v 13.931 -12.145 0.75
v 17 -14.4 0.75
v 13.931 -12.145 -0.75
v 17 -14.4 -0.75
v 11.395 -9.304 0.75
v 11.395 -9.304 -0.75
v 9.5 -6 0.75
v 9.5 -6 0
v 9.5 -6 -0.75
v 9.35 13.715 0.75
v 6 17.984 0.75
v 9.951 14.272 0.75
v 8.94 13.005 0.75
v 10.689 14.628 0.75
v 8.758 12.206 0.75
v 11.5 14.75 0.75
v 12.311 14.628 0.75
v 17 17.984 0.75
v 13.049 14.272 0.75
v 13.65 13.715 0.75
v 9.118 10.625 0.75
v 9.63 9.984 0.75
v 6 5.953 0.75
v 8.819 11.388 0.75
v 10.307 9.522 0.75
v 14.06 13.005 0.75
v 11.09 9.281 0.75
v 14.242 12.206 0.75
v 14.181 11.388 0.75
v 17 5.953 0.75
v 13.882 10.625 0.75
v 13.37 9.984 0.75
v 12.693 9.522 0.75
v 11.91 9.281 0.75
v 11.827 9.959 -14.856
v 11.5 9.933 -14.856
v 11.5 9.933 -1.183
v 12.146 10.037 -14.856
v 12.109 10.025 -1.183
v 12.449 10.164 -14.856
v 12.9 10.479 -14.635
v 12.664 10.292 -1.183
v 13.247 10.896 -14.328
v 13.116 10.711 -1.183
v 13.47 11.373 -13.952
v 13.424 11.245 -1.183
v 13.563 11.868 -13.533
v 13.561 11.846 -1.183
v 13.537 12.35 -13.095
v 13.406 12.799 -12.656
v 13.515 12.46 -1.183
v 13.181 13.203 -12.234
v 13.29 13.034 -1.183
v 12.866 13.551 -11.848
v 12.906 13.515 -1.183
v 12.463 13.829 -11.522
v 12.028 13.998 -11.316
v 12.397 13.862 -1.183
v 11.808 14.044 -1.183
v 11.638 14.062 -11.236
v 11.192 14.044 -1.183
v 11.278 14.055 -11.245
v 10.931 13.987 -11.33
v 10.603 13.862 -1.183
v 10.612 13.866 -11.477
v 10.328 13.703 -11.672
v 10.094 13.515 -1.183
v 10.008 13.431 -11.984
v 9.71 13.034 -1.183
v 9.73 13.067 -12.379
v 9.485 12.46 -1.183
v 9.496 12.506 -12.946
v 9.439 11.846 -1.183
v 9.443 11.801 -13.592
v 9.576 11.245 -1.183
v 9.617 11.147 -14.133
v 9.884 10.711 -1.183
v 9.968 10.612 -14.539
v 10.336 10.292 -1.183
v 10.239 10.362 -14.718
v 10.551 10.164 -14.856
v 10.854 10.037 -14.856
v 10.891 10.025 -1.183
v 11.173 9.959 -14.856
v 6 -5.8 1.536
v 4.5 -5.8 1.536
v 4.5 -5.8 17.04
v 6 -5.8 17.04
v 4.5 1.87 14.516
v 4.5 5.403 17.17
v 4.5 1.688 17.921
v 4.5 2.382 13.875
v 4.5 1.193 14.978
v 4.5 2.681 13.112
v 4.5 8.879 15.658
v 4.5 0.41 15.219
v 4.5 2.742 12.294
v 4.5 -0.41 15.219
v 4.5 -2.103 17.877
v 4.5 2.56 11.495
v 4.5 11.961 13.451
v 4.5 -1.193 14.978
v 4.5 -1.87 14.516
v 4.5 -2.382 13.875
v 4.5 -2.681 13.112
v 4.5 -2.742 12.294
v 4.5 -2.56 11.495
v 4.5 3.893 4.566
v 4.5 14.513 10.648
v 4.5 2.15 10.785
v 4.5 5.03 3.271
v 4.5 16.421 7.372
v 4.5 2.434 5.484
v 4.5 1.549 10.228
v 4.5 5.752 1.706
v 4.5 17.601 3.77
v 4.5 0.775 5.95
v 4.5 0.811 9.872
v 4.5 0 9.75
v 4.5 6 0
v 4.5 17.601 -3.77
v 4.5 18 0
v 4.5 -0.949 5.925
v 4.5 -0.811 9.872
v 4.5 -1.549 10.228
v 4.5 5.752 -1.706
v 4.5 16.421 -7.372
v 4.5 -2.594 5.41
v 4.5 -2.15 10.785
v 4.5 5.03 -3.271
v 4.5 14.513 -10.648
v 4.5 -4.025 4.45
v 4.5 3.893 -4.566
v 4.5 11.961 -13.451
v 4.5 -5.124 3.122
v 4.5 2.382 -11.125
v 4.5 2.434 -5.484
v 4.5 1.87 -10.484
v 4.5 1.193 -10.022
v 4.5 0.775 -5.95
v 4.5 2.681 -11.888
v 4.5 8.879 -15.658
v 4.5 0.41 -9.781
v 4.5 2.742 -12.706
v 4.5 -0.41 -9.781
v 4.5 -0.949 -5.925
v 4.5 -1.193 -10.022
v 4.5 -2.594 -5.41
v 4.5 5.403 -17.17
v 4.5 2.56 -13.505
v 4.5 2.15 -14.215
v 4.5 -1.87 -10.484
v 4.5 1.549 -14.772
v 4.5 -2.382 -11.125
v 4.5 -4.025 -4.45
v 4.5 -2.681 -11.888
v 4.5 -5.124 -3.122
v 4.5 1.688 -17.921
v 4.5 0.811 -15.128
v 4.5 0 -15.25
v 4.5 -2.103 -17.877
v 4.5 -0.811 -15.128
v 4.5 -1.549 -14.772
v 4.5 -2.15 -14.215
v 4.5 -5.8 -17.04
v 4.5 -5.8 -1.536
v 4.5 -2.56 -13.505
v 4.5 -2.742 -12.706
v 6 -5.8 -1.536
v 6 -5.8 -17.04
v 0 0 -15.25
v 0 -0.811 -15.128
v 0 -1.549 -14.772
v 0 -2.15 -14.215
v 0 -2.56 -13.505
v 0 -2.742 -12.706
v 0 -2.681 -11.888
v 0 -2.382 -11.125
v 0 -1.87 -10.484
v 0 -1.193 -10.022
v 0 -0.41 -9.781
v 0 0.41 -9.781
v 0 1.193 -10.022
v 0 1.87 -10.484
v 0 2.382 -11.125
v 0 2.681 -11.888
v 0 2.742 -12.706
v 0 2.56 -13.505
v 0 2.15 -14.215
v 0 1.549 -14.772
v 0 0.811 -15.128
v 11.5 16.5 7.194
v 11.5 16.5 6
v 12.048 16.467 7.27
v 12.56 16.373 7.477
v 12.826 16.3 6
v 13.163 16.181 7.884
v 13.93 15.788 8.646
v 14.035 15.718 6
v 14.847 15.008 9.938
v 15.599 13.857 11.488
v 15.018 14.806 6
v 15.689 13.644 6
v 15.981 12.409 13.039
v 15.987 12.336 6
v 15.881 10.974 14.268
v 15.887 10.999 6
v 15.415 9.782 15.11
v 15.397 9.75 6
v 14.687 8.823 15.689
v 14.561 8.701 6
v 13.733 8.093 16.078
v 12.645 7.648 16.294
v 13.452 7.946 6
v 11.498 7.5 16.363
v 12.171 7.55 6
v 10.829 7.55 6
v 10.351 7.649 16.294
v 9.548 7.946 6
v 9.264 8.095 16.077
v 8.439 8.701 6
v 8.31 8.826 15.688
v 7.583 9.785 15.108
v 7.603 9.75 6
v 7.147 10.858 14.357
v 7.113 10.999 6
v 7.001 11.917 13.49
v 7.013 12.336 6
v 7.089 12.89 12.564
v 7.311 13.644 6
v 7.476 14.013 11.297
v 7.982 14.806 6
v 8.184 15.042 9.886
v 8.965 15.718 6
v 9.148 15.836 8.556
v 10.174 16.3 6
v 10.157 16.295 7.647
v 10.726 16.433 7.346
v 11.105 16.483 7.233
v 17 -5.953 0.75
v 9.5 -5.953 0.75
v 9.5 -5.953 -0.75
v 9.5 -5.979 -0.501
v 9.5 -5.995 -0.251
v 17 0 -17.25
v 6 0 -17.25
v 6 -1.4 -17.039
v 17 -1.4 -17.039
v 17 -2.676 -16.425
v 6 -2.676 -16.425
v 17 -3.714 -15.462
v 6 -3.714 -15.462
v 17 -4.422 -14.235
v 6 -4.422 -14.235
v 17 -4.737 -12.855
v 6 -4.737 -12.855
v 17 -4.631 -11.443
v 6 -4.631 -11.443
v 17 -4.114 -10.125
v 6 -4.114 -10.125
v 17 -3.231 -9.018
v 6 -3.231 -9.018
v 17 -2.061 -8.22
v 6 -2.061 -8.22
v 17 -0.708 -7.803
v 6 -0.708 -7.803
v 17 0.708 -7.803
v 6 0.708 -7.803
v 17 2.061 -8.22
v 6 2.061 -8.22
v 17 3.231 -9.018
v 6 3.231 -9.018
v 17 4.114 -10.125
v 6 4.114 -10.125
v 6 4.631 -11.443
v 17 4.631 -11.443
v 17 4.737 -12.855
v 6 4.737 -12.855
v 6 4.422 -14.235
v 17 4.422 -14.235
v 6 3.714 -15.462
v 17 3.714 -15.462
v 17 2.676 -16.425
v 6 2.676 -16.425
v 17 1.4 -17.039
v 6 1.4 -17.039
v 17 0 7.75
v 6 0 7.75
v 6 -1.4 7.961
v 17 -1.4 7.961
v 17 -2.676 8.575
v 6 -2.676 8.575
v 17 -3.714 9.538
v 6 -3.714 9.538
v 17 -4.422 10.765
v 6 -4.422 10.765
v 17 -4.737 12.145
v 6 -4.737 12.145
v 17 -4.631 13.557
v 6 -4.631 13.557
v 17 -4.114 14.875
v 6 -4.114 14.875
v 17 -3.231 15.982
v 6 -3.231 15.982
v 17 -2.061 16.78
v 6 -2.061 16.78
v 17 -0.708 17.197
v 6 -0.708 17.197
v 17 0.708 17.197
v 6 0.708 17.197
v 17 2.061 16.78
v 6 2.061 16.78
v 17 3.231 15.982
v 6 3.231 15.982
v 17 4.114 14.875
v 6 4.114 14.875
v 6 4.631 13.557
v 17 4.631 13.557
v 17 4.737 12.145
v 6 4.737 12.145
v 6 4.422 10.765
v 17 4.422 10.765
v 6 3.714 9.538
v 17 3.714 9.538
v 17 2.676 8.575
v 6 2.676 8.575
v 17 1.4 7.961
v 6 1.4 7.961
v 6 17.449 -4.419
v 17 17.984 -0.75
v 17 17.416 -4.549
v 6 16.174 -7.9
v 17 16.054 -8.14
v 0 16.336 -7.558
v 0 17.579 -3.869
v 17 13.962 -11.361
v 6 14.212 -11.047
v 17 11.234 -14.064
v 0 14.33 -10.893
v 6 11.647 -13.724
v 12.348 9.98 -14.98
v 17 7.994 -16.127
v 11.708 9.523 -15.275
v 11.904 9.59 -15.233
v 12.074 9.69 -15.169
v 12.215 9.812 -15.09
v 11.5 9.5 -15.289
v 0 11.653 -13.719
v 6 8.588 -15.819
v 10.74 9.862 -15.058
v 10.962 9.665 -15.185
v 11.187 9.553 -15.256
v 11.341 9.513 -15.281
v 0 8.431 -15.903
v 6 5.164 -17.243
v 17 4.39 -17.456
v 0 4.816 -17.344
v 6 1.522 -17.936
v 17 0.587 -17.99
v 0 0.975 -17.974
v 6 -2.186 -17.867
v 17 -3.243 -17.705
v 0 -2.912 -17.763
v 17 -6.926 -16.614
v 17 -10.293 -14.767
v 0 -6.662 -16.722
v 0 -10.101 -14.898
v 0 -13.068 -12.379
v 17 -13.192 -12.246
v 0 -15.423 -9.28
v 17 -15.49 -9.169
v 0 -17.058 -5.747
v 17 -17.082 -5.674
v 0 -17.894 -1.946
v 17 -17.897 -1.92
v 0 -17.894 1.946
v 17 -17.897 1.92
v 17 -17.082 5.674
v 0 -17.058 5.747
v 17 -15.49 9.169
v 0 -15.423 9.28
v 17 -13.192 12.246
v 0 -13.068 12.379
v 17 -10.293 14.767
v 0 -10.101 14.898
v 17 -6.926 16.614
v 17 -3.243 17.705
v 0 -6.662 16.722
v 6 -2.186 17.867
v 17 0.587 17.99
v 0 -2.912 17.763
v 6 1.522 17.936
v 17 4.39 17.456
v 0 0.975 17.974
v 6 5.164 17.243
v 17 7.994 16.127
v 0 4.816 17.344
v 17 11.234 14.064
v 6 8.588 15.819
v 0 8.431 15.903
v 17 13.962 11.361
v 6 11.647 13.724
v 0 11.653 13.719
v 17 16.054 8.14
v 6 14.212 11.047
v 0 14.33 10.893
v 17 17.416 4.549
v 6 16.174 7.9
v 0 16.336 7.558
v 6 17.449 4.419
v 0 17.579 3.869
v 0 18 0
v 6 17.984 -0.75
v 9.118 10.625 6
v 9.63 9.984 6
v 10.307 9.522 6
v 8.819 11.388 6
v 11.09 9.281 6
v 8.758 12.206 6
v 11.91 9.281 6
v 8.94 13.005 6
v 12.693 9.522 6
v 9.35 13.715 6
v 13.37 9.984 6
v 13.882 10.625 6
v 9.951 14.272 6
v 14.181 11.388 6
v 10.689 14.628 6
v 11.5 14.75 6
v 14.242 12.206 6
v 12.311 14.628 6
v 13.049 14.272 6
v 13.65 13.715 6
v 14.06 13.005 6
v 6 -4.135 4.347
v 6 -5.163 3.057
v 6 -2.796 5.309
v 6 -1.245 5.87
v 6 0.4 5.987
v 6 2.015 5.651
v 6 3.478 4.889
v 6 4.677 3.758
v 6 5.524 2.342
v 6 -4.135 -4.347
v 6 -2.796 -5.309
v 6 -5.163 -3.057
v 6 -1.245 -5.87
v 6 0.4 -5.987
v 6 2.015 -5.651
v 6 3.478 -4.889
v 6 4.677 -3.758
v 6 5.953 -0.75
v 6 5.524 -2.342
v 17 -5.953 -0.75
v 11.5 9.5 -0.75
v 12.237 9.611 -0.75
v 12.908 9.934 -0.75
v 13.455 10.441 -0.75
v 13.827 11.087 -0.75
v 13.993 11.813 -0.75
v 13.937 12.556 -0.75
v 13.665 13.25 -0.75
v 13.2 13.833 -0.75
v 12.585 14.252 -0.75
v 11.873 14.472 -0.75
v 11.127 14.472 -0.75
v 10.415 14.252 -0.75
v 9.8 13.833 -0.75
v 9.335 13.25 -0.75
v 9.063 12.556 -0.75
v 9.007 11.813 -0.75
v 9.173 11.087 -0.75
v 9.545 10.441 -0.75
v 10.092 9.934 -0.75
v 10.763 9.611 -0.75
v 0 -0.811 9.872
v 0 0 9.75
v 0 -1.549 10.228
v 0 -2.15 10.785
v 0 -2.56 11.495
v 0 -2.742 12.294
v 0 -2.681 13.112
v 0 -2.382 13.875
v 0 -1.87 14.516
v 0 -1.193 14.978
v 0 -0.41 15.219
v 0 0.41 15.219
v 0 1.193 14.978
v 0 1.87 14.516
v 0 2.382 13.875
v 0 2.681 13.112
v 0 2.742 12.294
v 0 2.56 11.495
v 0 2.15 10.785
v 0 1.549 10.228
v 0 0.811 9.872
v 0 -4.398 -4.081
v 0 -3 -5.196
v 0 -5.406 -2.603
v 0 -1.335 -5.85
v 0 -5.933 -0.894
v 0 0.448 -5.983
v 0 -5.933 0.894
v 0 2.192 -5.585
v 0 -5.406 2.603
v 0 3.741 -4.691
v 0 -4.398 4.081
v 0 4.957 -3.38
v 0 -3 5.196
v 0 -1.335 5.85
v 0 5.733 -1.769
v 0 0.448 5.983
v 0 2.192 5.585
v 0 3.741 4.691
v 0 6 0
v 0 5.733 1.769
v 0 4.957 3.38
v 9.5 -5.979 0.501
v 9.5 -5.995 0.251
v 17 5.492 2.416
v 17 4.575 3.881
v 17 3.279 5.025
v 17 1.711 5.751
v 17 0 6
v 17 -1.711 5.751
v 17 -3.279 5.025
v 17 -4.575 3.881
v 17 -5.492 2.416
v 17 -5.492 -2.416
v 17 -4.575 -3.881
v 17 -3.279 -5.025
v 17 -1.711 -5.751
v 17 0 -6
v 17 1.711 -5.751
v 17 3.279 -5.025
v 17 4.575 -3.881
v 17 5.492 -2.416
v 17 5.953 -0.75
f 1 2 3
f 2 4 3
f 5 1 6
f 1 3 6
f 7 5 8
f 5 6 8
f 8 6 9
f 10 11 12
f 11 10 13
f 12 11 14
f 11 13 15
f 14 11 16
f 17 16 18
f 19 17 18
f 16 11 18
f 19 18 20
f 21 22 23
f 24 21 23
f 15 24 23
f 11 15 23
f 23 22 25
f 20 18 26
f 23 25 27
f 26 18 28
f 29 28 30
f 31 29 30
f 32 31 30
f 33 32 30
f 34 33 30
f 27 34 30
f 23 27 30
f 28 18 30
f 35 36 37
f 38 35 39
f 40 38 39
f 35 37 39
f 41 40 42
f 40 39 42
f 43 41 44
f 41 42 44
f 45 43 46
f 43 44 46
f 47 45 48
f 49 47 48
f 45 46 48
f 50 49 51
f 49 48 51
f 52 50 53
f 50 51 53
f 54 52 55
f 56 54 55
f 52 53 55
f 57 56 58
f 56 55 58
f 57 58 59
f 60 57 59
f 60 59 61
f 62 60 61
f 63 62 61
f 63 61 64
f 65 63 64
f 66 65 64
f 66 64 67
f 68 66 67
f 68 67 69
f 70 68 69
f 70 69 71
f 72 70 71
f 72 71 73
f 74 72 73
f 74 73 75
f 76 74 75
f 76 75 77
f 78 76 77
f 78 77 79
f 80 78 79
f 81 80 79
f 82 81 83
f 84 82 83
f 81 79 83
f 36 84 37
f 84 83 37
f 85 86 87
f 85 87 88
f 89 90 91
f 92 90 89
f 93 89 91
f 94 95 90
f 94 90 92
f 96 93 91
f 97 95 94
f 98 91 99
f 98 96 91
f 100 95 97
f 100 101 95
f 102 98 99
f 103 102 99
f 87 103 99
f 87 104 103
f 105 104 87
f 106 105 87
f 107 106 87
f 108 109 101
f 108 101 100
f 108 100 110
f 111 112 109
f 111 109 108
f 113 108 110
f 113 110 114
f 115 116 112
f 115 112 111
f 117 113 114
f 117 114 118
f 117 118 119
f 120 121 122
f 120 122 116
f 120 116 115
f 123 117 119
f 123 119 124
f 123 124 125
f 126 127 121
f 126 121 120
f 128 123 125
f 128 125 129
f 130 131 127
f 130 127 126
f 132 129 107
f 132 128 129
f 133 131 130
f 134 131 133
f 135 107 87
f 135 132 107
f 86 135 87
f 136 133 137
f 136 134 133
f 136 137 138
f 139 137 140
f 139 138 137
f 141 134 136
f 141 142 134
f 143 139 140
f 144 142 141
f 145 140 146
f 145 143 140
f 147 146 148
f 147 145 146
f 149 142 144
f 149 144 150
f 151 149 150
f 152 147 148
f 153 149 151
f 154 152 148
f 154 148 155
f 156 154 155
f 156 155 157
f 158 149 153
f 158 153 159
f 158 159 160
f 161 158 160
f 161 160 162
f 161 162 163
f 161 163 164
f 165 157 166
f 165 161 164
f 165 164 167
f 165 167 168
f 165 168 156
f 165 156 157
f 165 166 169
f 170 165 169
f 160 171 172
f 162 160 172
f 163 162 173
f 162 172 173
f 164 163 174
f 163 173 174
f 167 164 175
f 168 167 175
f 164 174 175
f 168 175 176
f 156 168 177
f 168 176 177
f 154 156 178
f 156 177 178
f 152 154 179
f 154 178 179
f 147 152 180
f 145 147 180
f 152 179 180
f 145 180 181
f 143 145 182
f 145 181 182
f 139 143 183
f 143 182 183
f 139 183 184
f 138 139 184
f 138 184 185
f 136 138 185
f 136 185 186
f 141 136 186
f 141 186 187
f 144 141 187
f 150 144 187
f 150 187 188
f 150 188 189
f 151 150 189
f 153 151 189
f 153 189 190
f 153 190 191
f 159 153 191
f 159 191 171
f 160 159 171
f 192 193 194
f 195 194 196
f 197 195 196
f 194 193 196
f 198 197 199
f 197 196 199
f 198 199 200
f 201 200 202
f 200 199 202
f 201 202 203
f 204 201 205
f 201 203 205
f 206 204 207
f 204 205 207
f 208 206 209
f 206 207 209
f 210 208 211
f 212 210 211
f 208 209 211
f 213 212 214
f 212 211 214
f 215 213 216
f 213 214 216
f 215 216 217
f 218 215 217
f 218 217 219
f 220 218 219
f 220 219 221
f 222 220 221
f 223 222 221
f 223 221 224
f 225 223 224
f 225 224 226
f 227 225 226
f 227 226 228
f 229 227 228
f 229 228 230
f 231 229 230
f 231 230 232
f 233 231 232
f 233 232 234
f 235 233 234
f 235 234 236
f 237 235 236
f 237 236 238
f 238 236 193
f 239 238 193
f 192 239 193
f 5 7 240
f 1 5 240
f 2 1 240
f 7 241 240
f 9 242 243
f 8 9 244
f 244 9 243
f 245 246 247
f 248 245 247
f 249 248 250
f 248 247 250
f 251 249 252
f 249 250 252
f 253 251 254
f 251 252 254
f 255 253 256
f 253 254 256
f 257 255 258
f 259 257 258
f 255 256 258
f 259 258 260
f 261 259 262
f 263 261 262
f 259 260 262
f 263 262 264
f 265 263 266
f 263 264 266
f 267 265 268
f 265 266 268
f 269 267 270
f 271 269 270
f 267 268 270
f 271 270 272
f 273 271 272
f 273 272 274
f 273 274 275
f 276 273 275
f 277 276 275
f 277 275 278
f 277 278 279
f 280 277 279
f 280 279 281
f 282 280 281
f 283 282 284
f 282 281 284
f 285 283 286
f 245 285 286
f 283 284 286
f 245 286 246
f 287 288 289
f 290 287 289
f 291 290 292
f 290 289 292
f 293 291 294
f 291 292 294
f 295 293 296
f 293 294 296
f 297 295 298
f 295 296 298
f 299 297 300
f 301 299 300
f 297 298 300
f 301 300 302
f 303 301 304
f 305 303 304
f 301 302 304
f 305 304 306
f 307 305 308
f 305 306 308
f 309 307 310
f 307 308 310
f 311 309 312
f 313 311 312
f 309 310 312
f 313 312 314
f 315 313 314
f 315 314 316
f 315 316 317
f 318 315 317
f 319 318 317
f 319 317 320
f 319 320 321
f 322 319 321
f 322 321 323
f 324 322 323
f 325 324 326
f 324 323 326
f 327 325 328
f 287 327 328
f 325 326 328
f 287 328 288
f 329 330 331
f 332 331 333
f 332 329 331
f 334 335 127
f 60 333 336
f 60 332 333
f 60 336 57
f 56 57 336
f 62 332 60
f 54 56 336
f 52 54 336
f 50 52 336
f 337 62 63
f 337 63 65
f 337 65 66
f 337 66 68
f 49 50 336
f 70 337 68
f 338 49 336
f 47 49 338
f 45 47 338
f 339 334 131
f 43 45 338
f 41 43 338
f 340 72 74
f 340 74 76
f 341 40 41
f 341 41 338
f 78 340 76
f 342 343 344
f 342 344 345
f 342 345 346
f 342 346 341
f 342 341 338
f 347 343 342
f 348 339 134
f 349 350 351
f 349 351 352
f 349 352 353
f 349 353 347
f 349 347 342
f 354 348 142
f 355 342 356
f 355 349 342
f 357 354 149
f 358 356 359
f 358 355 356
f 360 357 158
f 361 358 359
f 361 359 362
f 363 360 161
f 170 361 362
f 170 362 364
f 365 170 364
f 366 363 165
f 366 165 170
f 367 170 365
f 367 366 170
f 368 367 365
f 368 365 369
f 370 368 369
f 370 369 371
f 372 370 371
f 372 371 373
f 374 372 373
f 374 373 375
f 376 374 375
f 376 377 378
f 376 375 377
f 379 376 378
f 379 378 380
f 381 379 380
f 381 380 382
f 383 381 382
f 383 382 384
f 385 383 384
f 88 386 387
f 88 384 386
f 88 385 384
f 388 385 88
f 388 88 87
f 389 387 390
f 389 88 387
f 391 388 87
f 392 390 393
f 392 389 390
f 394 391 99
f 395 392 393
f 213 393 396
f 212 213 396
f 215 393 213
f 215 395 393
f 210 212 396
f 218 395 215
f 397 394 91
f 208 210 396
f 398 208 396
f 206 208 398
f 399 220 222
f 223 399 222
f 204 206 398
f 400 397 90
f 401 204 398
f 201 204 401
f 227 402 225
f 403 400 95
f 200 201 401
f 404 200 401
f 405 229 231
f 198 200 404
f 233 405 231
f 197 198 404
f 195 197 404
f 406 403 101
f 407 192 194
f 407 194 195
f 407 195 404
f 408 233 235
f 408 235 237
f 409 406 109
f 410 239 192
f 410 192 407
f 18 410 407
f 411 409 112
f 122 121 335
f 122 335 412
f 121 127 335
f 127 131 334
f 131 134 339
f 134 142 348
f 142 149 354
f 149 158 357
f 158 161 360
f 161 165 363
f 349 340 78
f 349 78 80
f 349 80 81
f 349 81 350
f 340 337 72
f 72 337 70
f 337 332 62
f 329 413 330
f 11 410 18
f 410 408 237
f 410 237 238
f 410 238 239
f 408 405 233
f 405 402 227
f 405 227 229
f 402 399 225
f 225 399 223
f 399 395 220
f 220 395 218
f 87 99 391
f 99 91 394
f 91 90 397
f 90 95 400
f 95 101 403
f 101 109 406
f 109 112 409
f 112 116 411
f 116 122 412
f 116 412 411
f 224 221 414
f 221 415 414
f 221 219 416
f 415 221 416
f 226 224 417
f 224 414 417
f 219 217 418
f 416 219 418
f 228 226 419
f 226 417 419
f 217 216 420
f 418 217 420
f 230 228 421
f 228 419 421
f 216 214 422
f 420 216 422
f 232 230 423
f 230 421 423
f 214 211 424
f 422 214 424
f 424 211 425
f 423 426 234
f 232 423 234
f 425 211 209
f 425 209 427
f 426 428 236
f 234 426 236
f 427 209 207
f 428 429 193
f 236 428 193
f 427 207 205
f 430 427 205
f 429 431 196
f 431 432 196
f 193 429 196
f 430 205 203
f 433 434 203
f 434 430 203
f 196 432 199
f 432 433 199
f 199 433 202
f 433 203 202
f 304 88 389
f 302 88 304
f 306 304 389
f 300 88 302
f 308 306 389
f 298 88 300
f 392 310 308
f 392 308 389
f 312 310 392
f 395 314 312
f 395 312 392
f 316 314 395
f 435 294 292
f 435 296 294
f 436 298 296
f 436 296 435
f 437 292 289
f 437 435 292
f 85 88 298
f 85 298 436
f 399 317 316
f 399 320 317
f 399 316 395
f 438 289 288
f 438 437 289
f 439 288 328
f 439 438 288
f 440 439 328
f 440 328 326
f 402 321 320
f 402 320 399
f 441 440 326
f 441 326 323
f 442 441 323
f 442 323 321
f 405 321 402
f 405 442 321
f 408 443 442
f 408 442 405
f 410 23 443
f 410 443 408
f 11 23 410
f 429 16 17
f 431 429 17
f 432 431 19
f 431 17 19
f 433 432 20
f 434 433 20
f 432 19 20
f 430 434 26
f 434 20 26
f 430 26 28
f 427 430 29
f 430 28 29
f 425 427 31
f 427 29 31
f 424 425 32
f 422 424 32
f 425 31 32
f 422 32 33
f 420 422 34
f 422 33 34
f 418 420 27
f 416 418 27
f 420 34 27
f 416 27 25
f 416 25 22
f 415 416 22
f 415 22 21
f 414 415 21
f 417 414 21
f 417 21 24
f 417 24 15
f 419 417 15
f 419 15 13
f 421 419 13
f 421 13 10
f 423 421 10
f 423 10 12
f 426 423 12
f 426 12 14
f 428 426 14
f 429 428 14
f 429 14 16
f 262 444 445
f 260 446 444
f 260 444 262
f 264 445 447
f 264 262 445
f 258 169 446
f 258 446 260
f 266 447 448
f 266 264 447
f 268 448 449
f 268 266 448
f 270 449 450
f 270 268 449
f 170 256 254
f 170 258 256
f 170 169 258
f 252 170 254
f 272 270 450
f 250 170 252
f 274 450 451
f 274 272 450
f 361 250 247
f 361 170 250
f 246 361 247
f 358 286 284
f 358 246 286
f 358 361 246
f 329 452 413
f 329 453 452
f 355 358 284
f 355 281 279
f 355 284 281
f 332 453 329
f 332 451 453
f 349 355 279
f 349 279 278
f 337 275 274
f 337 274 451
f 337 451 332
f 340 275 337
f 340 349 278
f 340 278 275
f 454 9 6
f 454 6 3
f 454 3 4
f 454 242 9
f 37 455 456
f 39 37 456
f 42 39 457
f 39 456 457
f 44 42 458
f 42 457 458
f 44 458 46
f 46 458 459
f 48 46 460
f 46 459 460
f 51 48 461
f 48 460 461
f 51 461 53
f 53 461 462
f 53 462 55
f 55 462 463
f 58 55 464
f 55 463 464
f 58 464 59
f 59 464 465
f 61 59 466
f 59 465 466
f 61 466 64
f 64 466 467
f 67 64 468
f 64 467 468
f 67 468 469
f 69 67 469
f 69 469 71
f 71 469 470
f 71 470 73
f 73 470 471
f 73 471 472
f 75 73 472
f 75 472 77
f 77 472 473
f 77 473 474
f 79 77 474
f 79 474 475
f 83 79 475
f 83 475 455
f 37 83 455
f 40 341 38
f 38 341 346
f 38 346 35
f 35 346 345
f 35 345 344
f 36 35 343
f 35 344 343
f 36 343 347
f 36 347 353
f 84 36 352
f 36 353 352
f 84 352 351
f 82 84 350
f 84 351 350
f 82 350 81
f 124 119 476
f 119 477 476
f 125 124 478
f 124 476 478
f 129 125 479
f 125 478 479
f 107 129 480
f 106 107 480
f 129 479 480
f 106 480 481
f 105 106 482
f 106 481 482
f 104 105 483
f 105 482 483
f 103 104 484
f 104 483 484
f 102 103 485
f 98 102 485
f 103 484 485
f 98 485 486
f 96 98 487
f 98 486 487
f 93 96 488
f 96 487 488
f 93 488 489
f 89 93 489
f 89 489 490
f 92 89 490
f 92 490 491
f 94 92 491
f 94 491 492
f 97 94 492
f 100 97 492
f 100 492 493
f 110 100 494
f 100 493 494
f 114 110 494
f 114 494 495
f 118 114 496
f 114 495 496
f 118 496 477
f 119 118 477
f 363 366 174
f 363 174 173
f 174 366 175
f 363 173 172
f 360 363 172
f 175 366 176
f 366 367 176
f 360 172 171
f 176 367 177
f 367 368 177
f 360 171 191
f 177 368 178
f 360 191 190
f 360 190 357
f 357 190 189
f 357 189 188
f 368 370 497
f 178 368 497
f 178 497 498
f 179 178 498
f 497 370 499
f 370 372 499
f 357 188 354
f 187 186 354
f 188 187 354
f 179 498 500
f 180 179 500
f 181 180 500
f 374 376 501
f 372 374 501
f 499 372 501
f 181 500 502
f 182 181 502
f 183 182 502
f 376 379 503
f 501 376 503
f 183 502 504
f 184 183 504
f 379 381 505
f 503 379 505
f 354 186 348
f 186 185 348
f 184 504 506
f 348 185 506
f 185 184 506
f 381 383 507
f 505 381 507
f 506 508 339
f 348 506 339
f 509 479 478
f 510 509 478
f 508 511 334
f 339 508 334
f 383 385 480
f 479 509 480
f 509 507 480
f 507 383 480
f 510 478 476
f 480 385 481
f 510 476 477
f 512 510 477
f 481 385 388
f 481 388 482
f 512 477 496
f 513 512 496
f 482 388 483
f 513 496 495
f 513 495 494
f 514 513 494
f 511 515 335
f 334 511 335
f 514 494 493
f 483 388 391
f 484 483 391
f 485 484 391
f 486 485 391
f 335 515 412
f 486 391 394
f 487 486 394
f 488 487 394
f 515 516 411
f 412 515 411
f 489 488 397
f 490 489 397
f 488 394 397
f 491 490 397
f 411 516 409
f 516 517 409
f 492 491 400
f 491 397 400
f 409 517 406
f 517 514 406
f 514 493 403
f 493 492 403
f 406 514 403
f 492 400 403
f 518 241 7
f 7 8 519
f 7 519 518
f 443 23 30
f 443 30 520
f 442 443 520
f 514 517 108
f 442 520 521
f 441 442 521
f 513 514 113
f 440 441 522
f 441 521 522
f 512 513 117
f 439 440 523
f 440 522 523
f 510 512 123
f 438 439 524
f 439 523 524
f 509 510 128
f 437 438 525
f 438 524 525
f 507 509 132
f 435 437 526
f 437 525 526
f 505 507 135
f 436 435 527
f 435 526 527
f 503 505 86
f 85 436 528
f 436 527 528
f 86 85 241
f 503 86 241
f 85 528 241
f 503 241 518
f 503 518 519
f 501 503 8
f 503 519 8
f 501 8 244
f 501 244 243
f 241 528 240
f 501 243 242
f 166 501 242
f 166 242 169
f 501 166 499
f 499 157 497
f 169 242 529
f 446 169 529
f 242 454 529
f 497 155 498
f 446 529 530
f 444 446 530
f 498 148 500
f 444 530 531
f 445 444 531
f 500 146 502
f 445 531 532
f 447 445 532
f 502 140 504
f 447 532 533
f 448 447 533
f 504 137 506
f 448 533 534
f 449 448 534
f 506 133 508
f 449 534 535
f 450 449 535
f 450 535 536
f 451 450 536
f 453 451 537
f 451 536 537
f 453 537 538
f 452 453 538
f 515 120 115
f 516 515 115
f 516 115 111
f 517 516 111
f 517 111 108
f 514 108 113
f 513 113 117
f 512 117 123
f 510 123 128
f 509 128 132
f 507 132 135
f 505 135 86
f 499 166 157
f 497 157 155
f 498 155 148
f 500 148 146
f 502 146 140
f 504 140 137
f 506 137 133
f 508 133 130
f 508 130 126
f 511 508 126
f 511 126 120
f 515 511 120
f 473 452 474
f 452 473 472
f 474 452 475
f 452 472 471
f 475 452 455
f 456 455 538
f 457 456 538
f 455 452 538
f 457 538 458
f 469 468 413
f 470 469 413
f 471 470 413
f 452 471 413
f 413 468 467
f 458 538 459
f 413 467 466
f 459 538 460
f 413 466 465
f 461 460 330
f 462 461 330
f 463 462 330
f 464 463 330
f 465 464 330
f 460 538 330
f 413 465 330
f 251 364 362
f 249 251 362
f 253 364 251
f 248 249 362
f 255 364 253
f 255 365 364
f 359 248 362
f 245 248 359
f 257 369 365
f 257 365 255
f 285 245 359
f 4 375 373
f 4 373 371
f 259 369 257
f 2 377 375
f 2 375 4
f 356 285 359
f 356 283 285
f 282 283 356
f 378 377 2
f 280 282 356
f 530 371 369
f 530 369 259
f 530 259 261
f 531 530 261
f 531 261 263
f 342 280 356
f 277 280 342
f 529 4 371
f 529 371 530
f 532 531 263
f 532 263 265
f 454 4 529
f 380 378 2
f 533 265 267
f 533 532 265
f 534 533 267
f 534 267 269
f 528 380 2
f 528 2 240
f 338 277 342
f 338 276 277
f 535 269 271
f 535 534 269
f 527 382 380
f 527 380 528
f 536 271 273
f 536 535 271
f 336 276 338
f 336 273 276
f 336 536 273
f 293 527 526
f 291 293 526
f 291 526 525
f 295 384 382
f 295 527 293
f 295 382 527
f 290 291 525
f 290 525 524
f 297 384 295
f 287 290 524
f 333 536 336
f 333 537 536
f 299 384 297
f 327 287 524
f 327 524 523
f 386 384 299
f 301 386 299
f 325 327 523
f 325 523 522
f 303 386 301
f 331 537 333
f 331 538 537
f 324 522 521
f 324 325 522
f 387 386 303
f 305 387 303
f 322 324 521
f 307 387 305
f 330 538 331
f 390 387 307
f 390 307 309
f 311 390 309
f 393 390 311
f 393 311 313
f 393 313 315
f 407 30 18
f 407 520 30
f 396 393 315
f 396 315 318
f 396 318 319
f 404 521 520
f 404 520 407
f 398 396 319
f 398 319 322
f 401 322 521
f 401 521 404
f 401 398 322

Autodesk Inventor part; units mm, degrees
sketch "Sketch_1" plane through (0, 0, 0) normal (0, 0, 1) x (1, 0, 0)
  line L0 (17, 0) -> (0, 0)
  line L1 (0, 18) -> (0, 6)
  line L2 (0, 6) -> (17, 6)
  line L3 (17, 6) -> (17, 18)
  line L4 (17, 18) -> (0, 18)
revolve "Revolution1" add sketch "Sketch_1" angle 360 about axis through (17, 0, 0) along (1, 0, 0)
sketch "Sketch_2" plane through (0, 0, 0) normal (0, 0, 1) x (1, 0, 0)
  line L0 (4.5, -5.8) -> (6, -5.8)
  line L1 (6, -5.8) -> (6, 30.2)
  line L2 (6, 30.2) -> (4.5, 30.2)
  line L3 (4.5, 30.2) -> (4.5, -5.8)
extrude "Extrusion1" cut sketch "Sketch_2" along normal mid plane 36
sketch "Sketch3" plane through (17, 0, 0) normal (1, 0, 0) x (0, 0, -1)
  point P0 (-12.5, 0)
hole "Hole1" at (17, 0, 12.5) direction (-1, 0, 0) diameter 5.5 depth 17 counterbore diameter 9.5 counterbore depth 12.5
sketch "Sketch4" plane through (17, 0, 0) normal (1, 0, 0) x (0, 0, -1)
  point P0 (12.5, 0)
hole "Hole2" at (17, 0, -12.5) direction (-1, 0, 0) diameter 5.5 depth 17 counterbore diameter 9.5 counterbore depth 12.5
sketch "Sketch_5" plane through (17, 0, 0) normal (1, 0, 0) x (0, 0, -1)
  line L0 (-0.75, 0) -> (0.75, 0)
  line L1 (0.75, 0) -> (0.75, 36)
  line L2 (0.75, 36) -> (-0.75, 36)
  line L3 (-0.75, 36) -> (-0.75, 0)
extrude "Extrusion2" cut sketch "Sketch_5" against normal blind 11
sketch "Sketch_6" plane through (0, 0, 0) normal (0, 0, 1) x (1, 0, 0)
  arc A0 (9.5, -6) -> (17, -14.4) centre (26.2631, 1.4189) ccw
  line L0 (17, -14.4) -> (17, 3.6)
  line L1 (17, 3.6) -> (9.5, 3.6)
  line L2 (9.5, 3.6) -> (9.5, -6)
extrude "Extrusion3" cut sketch "Sketch_6" along normal mid plane 1.5
sketch "Sketch_4" plane through (11.5, 0, 0) normal (1, 0, 0) x (0, 0, -1)
  line L0 (0, 12) -> (-18, 12)
  line L1 (-18, 12) -> (-18, 16.5)
  line L2 (-18, 16.5) -> (-6, 16.5)
  line L3 (-6, 16.5) -> (-6, 14.75)
  line L4 (-6, 14.75) -> (0, 14.75)
  line L5 (0, 14.75) -> (0, 12)
  line L6 (0, 12) -> (-18, 12)
revolve "Revolution2" cut sketch "Sketch_4" angle 360 about axis through (11.5, 12, 0) along (0, 0, -1)
sketch "Sketch_7" plane through (11.5, 0, 0) normal (1, 0, 0) x (0, 0, -1)
  line L0 (0.75, 12) -> (15.2889, 12)
  line L1 (15.2889, 12) -> (15.2889, 9.5)
  line L2 (15.2889, 9.5) -> (14.8559, 9.933)
  line L3 (14.8559, 9.933) -> (1.183, 9.933)
  line L4 (1.183, 9.933) -> (0.75, 9.5)
  line L5 (0.75, 9.5) -> (0.75, 12)
  line L6 (0.75, 12) -> (15.2889, 12)
revolve "Revolution3" cut sketch "Sketch_7" angle 360 about axis through (11.5, 12, -0.75) along (0, 0, 1)
thread "Thread1" size "M5x0.8" class "6H" standard "ISO Metric profile" length 13.6729
ref_plane "b_s_XY" through (11.5, 12, 6) normal (0, 0, 1) x (1, 0, 0)
ref_plane "b_s_YZ" through (11.5, 12, 6) normal (1, 0, 0) x (0, 1, 0)
ref_plane "b_s_ZX" through (11.5, 12, 6) normal (0, 1, 0) x (0, 0, 1)
properties part number "SSTHMR12b"
